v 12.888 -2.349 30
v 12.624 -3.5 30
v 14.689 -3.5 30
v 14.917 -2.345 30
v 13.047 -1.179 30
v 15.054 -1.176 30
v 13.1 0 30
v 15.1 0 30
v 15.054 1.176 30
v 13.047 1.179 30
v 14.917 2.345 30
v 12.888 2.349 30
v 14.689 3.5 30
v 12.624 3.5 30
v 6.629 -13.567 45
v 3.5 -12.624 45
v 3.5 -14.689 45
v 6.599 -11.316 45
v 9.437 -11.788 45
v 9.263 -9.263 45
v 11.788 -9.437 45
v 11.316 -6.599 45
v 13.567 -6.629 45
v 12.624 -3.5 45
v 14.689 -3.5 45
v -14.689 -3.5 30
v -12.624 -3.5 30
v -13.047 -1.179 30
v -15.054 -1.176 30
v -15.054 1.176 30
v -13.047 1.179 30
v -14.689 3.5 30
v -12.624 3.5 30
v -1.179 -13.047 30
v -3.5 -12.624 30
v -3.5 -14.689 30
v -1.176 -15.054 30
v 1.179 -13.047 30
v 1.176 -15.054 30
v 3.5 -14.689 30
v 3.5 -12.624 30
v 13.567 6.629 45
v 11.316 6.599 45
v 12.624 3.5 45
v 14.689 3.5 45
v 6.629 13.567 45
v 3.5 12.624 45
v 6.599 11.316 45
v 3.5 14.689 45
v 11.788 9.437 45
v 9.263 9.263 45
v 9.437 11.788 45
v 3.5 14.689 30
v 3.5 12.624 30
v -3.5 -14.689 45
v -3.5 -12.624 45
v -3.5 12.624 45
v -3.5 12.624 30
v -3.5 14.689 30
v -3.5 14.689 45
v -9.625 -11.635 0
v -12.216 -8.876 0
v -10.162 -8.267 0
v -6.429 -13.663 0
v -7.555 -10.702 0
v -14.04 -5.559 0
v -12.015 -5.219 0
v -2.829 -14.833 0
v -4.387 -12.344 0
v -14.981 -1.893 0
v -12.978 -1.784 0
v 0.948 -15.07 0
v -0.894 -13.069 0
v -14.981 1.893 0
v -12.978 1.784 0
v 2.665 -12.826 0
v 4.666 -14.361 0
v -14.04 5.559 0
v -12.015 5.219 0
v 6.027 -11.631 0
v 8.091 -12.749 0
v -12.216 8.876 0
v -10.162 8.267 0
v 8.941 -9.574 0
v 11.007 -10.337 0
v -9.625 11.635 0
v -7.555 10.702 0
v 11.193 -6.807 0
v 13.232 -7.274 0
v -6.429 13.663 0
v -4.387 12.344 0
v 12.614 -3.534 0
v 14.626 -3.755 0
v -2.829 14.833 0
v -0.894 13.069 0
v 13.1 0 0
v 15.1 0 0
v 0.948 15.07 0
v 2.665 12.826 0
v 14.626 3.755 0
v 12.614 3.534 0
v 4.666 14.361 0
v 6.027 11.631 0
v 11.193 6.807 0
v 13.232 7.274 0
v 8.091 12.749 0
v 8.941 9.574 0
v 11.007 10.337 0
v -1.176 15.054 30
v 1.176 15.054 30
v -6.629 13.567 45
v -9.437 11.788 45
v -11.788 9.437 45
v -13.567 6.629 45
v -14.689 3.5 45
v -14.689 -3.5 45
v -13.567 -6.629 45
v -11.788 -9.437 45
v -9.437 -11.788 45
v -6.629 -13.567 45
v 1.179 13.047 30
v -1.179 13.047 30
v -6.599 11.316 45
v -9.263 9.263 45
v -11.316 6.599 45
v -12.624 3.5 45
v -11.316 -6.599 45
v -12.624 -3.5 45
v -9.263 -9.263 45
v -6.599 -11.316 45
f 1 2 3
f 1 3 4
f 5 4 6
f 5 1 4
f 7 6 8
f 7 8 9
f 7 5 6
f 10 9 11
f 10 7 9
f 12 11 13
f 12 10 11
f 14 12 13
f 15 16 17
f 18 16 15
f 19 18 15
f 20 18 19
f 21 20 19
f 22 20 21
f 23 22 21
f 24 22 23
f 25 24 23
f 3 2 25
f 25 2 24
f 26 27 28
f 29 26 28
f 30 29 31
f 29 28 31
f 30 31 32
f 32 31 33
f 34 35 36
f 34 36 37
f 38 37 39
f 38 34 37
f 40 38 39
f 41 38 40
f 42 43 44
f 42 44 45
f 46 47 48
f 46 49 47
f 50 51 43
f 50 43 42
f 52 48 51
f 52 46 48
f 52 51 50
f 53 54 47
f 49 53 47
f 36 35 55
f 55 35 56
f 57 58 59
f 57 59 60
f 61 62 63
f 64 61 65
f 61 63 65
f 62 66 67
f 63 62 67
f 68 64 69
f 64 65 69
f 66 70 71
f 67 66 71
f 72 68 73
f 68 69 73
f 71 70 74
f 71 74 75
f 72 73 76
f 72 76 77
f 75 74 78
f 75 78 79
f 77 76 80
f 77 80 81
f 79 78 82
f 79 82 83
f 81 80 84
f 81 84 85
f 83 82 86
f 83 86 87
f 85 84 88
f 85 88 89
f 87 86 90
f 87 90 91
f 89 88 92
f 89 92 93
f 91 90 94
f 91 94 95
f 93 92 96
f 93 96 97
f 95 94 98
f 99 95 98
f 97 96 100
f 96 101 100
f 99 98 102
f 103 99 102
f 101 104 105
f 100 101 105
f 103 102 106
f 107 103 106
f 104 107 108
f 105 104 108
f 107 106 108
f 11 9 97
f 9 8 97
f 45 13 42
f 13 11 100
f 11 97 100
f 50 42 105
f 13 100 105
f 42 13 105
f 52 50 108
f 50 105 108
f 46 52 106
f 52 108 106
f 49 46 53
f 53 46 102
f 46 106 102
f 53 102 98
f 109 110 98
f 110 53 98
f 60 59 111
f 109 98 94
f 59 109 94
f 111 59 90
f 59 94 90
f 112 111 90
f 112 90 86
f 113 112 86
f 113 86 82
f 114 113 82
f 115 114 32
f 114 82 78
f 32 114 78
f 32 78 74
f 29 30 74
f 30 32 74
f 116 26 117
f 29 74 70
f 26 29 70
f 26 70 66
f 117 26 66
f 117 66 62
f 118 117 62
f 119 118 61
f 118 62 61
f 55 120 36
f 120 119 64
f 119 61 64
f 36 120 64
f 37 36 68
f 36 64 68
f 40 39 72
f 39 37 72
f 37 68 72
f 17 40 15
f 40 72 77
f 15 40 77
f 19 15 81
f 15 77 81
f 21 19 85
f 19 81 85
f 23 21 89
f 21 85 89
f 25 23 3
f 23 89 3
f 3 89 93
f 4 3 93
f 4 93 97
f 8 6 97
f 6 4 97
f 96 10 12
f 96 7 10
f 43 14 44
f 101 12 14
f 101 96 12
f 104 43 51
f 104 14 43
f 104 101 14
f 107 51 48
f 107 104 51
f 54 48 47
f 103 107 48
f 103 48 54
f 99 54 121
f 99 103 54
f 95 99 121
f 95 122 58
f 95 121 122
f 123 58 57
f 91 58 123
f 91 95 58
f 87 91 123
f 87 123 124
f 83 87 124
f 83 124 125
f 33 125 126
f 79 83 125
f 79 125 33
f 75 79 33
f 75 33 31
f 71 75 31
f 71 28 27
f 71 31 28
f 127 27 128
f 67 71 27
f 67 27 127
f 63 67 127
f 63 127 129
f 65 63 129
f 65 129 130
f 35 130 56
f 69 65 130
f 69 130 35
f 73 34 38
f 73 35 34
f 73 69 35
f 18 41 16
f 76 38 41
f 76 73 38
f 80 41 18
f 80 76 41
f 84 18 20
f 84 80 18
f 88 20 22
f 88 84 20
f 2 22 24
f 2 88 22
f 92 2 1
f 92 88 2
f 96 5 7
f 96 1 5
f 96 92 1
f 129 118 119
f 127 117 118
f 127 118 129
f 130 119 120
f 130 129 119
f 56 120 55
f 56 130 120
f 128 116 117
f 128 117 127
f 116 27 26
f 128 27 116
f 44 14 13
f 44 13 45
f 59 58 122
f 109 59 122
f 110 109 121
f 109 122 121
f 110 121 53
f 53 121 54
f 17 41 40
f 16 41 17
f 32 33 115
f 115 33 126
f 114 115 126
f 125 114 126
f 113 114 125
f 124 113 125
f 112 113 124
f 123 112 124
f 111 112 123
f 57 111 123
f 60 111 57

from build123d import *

# Parameters (mm, degrees)
F0_R     = 15.1
F0_R_2   = 13.1
F1_DEPTH = 45
F2_W     = 7
F2_H     = 15
F3_DEPTH = 25
F4_DEPTH = 25
F5_W     = 7
F5_H     = 15
F6_DEPTH = 25
F7_DEPTH = 25


with BuildPart() as f1:
    # F0 (on Top) → F1 (new body)
    with BuildSketch(Plane.XY):
        Circle(F0_R)
        Circle(F0_R_2, mode=Mode.SUBTRACT)
    extrude(amount=F1_DEPTH)

    # F2 (on Front) → F3 (cut)
    with BuildSketch(Plane.XZ):
        with Locations((0, 37.5)):
            Rectangle(F2_W, F2_H)
    extrude(amount=-F3_DEPTH, mode=Mode.SUBTRACT)

    # F2 (on Front) → F4 (cut)
    with BuildSketch(Plane.XZ):
        with Locations((0, 37.5)):
            Rectangle(F2_W, F2_H)
    extrude(amount=F4_DEPTH, mode=Mode.SUBTRACT)

    # F5 (on Right) → F6 (cut)
    with BuildSketch(Plane.YZ):
        with Locations((0, 37.5)):
            Rectangle(F5_W, F5_H)
    extrude(amount=-F6_DEPTH, mode=Mode.SUBTRACT)

    # F5 (on Right) → F7 (cut)
    with BuildSketch(Plane.YZ):
        with Locations((0, 37.5)):
            Rectangle(F5_W, F5_H)
    extrude(amount=F7_DEPTH, mode=Mode.SUBTRACT)


solid = f1.part
